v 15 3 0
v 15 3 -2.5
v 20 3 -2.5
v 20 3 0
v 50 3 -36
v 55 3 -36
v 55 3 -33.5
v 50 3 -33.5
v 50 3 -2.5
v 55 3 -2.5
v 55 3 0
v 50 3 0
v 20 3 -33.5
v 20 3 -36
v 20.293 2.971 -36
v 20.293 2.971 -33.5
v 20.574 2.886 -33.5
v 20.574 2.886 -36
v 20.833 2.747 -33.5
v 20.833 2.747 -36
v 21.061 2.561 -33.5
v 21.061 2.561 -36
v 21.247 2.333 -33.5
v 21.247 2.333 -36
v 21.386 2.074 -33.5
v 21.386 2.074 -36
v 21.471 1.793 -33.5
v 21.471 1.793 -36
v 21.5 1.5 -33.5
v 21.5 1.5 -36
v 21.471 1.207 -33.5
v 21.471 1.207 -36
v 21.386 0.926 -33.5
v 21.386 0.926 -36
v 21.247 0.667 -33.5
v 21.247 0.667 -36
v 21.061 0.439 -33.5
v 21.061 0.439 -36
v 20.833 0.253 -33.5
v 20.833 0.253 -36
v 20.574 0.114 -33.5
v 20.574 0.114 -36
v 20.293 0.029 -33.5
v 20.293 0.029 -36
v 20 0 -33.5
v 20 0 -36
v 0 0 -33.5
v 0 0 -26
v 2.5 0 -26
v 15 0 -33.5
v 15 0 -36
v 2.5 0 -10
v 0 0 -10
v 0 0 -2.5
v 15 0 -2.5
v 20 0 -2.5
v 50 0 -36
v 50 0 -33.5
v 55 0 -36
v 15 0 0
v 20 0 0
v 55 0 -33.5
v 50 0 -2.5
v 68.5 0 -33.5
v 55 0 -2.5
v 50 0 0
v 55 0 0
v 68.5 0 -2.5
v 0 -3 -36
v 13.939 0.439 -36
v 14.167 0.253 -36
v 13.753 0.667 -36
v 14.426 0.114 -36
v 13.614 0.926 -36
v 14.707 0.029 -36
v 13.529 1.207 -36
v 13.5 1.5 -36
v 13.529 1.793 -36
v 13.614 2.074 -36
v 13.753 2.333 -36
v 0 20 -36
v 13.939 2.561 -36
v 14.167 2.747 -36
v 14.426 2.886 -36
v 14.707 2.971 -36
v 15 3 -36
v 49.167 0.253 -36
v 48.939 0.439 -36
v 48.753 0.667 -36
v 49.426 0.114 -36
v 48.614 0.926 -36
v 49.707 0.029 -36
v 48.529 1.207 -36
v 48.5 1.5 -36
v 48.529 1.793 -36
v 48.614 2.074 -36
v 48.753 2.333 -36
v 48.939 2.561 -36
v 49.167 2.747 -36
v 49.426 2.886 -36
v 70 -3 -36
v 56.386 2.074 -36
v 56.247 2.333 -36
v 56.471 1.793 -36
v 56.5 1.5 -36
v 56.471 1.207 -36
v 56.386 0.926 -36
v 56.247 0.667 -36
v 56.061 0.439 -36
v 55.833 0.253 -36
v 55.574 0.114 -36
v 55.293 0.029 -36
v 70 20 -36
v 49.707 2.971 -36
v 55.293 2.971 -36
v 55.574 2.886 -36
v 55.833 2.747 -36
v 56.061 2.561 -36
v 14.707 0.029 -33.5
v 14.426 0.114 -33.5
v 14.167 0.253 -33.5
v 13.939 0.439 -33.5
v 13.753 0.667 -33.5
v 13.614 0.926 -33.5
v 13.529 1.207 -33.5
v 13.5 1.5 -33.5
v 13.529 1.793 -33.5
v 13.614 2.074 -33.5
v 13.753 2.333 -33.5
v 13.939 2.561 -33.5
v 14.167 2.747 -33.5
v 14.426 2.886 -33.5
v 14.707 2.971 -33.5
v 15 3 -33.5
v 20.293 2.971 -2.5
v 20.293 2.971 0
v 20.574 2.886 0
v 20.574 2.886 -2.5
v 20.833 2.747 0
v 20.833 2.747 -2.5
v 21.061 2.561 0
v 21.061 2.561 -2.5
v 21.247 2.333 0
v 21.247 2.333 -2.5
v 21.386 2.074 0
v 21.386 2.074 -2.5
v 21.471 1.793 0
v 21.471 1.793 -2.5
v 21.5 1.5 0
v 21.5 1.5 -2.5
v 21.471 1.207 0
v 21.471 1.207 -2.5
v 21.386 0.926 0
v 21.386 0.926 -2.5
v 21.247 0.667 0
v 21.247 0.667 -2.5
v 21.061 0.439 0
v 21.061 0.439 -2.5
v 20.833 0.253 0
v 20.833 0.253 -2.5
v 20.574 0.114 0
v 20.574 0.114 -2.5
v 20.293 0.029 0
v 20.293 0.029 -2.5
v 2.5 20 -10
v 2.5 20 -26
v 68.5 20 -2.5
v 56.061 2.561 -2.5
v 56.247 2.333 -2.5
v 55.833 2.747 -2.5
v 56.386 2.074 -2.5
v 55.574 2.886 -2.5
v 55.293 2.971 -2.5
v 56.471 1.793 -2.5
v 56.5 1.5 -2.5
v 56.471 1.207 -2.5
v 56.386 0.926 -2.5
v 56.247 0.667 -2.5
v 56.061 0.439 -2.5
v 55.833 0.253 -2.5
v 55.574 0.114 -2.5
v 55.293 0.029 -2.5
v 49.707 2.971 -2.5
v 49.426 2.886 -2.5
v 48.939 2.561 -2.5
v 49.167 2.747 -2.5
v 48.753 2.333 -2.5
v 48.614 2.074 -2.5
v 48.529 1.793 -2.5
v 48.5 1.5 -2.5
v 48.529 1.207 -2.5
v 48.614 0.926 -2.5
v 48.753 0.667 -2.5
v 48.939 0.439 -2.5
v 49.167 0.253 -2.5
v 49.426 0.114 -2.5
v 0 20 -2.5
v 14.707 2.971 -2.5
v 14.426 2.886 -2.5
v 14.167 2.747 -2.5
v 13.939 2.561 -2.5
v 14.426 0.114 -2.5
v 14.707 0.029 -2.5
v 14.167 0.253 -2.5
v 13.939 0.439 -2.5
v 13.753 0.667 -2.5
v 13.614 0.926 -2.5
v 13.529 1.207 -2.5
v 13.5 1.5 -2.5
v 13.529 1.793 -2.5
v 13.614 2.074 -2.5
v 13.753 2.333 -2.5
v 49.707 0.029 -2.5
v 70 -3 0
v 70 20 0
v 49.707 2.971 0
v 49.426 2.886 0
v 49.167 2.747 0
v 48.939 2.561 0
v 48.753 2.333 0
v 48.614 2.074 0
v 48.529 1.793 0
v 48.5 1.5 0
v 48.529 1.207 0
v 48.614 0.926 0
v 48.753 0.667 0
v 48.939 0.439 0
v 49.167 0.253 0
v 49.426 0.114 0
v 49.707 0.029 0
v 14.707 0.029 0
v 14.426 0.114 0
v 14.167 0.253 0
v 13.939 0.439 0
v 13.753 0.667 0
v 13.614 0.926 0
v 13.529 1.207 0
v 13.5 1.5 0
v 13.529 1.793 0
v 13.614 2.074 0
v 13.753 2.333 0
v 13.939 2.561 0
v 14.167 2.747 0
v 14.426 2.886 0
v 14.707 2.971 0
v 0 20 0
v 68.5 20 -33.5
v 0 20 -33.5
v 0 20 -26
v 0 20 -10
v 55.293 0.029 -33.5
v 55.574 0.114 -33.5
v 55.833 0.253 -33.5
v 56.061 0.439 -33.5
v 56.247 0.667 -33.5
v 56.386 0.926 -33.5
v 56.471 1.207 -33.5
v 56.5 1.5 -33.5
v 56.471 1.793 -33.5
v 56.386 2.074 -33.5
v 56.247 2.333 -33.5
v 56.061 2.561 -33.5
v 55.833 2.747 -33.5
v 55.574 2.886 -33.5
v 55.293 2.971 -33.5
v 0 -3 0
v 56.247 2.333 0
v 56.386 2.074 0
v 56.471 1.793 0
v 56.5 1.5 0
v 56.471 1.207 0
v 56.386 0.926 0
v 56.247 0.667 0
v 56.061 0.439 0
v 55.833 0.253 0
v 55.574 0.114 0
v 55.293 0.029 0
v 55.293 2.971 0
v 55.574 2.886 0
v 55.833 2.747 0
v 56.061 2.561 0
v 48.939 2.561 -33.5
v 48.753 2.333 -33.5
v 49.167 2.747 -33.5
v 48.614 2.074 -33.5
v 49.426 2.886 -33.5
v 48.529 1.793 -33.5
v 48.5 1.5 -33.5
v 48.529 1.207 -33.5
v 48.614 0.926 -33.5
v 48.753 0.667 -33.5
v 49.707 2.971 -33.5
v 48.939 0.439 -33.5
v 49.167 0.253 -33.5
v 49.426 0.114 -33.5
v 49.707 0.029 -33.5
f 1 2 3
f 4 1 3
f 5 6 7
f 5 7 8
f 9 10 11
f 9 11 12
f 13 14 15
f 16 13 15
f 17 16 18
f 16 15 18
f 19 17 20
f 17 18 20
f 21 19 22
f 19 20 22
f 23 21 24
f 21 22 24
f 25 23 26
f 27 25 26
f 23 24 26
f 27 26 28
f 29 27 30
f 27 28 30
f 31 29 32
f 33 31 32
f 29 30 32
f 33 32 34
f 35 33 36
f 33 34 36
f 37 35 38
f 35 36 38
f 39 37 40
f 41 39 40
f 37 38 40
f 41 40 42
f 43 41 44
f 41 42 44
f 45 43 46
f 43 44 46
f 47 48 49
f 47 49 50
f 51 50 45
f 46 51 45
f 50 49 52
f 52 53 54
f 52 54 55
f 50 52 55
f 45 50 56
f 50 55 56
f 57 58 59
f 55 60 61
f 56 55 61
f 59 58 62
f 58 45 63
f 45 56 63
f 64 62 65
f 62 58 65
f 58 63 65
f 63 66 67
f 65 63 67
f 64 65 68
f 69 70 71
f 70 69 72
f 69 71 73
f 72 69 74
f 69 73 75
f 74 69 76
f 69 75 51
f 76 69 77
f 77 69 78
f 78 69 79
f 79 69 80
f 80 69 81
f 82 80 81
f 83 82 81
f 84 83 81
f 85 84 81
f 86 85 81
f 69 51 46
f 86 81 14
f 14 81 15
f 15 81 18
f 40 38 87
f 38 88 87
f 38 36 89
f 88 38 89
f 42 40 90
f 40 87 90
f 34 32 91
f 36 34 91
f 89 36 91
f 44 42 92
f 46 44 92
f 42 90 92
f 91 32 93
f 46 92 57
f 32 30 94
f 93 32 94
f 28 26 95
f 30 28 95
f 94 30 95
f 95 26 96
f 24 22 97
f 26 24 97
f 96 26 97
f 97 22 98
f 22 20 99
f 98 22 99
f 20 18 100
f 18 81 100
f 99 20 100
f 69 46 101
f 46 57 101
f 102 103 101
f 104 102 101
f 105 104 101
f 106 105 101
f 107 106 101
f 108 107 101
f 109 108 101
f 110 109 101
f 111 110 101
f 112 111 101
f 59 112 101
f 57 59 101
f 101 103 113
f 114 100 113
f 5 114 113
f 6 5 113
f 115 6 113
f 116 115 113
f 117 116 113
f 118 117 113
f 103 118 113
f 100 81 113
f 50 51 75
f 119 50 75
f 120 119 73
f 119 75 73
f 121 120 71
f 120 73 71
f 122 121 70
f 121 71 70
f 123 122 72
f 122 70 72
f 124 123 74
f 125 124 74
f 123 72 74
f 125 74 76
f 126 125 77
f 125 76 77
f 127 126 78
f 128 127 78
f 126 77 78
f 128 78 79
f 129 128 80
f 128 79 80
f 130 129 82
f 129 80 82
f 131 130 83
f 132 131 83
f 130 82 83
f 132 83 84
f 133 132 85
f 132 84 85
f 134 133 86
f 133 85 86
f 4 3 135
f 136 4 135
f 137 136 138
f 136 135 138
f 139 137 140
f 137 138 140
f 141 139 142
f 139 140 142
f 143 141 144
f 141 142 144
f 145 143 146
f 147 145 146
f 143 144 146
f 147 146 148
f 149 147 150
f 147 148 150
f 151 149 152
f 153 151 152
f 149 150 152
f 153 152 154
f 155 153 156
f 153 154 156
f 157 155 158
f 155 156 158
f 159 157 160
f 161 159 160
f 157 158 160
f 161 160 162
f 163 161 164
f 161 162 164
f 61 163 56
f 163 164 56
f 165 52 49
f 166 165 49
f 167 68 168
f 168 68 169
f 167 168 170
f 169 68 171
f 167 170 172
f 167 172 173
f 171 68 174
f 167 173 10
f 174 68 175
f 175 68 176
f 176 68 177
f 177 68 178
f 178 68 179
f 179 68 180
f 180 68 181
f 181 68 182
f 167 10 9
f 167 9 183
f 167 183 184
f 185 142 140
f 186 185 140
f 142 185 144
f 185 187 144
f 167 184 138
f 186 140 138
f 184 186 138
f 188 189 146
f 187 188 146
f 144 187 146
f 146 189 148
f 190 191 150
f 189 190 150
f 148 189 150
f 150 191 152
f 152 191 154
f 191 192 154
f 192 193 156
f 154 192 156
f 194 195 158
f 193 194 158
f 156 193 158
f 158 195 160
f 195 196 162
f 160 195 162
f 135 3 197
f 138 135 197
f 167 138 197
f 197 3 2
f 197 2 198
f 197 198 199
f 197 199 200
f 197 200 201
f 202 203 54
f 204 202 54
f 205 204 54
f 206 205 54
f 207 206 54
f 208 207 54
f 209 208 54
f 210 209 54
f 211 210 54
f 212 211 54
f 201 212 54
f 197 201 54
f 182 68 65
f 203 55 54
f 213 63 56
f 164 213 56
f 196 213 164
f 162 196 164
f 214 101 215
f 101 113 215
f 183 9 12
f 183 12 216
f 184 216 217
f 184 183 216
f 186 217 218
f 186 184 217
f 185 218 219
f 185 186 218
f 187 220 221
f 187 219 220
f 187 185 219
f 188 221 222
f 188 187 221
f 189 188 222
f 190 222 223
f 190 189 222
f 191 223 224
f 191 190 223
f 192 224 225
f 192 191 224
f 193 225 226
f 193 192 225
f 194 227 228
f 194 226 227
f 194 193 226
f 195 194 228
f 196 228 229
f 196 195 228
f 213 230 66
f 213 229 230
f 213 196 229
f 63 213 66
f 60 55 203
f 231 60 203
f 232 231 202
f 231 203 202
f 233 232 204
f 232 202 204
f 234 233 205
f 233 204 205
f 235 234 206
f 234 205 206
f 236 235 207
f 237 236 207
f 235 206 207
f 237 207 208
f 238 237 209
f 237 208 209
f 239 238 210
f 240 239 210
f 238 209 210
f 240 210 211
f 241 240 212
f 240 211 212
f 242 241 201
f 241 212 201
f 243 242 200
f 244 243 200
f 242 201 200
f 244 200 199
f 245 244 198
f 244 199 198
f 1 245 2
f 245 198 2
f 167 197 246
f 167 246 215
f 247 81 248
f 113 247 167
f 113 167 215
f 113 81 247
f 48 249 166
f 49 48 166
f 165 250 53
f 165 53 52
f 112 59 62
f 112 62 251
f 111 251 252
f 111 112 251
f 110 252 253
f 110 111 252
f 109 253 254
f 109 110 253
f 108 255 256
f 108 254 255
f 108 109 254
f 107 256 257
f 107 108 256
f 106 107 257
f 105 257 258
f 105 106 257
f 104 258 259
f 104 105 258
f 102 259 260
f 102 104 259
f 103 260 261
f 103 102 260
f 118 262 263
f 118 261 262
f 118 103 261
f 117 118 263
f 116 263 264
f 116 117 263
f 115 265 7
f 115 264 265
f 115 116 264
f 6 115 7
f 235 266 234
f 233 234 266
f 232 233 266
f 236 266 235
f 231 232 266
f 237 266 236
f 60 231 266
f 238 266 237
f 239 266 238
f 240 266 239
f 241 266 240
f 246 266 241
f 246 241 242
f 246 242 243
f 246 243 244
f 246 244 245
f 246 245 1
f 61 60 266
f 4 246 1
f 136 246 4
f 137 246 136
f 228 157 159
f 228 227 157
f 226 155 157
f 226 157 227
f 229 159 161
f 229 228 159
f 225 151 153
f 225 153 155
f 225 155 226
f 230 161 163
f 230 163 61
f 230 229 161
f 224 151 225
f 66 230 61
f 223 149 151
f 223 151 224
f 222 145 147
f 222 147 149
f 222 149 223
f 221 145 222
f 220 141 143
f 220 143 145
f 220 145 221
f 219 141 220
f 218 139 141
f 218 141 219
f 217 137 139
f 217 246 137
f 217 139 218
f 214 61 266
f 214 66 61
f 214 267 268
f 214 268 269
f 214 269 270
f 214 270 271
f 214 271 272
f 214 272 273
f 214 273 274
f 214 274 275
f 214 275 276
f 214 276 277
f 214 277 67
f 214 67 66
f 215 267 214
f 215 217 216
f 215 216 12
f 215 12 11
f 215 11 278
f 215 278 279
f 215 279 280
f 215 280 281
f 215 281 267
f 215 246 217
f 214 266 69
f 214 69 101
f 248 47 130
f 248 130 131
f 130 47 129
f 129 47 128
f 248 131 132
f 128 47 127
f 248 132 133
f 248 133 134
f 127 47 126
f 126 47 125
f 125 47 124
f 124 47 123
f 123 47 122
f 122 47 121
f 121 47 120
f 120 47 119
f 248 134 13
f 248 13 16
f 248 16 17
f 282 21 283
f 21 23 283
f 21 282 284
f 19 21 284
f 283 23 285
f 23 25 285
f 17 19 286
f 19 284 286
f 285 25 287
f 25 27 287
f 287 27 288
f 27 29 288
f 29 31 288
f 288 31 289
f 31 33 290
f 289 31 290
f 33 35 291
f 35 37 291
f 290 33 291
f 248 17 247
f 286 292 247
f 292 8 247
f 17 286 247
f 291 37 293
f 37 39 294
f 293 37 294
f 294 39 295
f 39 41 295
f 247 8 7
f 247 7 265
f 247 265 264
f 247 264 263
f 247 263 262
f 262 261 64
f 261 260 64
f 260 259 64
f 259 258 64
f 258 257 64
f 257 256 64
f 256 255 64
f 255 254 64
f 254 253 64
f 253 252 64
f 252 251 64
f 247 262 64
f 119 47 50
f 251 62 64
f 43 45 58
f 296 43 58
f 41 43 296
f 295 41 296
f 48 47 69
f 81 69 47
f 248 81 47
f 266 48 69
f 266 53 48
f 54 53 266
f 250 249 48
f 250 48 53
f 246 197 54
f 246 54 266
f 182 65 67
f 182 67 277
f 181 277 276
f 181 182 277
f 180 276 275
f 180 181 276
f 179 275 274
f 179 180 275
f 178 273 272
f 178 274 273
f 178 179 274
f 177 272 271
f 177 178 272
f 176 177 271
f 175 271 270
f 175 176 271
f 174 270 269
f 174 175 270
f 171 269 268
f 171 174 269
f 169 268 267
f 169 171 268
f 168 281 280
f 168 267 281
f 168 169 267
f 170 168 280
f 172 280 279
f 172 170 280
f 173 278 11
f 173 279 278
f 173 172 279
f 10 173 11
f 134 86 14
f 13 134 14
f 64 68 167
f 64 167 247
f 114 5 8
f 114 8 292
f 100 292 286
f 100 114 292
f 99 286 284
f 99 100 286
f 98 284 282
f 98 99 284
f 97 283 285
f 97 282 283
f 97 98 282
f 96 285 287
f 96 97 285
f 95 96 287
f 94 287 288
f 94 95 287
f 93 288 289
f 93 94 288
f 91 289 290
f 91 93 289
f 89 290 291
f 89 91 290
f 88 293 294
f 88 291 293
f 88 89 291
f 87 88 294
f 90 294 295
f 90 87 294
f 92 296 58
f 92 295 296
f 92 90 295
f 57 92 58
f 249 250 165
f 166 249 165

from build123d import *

# Parameters (mm, degrees)
SKETCH1_W               = 1.5
SKETCH1_H               = 31
SKETCH1_W_2             = 2.5
SKETCH1_H_2             = 16
BOSS_EXTRUDE1_DEPTH     = 20
SKETCH2_W               = 70
SKETCH2_H               = 36
BOSS_EXTRUDE2_DEPTH     = 3
CUT_EXTRUDE1_DEPTH      = 82.215762017
CUT_EXTRUDE1_DEPTH_BACK = 82.215762017


with BuildPart() as part:
    # Sketch1 → Boss-Extrude1 (new body)
    with BuildSketch(Plane(origin=(0, 0, 0), x_dir=(1, 0, 0), z_dir=(0, 1, 0))):
        Polygon((70, 36), (0, 36), (0, 33.5), (68.5, 33.5), (70, 33.5), align=None)
        with Locations((69.25, 18)):
            Rectangle(SKETCH1_W, SKETCH1_H)
        Polygon((70, 0), (70, 2.5), (68.5, 2.5), (0, 2.5), (0, 0), align=None)
        with Locations((1.25, 18)):
            Rectangle(SKETCH1_W_2, SKETCH1_H_2)
    extrude(amount=BOSS_EXTRUDE1_DEPTH)

    # Sketch2 → Boss-Extrude2 (add)
    with BuildSketch(Plane.XZ):
        with Locations((35, -18)):
            Rectangle(SKETCH2_W, SKETCH2_H)
    extrude(amount=BOSS_EXTRUDE2_DEPTH)

    # Sketch3 → Cut-Extrude1 (cut, two sides: drawn at the far end of the back side and taken through both)
    with BuildSketch(Plane.XY.offset(-CUT_EXTRUDE1_DEPTH_BACK)):
        with BuildLine():
            Line((15, 3), (20, 3))
            ThreePointArc((20, 3), (21.5, 1.5), (20, 0))
            Line((20, 0), (15, 0))
            ThreePointArc((15, 0), (13.5, 1.5), (15, 3))
        make_face()
        with BuildLine():
            Line((55, 3), (50, 3))
            ThreePointArc((50, 3), (48.5, 1.5), (50, 0))
            Line((50, 0), (55, 0))
            ThreePointArc((55, 0), (56.5, 1.5), (55, 3))
        make_face()
    extrude(amount=CUT_EXTRUDE1_DEPTH + CUT_EXTRUDE1_DEPTH_BACK, mode=Mode.SUBTRACT)


solid = part.part
